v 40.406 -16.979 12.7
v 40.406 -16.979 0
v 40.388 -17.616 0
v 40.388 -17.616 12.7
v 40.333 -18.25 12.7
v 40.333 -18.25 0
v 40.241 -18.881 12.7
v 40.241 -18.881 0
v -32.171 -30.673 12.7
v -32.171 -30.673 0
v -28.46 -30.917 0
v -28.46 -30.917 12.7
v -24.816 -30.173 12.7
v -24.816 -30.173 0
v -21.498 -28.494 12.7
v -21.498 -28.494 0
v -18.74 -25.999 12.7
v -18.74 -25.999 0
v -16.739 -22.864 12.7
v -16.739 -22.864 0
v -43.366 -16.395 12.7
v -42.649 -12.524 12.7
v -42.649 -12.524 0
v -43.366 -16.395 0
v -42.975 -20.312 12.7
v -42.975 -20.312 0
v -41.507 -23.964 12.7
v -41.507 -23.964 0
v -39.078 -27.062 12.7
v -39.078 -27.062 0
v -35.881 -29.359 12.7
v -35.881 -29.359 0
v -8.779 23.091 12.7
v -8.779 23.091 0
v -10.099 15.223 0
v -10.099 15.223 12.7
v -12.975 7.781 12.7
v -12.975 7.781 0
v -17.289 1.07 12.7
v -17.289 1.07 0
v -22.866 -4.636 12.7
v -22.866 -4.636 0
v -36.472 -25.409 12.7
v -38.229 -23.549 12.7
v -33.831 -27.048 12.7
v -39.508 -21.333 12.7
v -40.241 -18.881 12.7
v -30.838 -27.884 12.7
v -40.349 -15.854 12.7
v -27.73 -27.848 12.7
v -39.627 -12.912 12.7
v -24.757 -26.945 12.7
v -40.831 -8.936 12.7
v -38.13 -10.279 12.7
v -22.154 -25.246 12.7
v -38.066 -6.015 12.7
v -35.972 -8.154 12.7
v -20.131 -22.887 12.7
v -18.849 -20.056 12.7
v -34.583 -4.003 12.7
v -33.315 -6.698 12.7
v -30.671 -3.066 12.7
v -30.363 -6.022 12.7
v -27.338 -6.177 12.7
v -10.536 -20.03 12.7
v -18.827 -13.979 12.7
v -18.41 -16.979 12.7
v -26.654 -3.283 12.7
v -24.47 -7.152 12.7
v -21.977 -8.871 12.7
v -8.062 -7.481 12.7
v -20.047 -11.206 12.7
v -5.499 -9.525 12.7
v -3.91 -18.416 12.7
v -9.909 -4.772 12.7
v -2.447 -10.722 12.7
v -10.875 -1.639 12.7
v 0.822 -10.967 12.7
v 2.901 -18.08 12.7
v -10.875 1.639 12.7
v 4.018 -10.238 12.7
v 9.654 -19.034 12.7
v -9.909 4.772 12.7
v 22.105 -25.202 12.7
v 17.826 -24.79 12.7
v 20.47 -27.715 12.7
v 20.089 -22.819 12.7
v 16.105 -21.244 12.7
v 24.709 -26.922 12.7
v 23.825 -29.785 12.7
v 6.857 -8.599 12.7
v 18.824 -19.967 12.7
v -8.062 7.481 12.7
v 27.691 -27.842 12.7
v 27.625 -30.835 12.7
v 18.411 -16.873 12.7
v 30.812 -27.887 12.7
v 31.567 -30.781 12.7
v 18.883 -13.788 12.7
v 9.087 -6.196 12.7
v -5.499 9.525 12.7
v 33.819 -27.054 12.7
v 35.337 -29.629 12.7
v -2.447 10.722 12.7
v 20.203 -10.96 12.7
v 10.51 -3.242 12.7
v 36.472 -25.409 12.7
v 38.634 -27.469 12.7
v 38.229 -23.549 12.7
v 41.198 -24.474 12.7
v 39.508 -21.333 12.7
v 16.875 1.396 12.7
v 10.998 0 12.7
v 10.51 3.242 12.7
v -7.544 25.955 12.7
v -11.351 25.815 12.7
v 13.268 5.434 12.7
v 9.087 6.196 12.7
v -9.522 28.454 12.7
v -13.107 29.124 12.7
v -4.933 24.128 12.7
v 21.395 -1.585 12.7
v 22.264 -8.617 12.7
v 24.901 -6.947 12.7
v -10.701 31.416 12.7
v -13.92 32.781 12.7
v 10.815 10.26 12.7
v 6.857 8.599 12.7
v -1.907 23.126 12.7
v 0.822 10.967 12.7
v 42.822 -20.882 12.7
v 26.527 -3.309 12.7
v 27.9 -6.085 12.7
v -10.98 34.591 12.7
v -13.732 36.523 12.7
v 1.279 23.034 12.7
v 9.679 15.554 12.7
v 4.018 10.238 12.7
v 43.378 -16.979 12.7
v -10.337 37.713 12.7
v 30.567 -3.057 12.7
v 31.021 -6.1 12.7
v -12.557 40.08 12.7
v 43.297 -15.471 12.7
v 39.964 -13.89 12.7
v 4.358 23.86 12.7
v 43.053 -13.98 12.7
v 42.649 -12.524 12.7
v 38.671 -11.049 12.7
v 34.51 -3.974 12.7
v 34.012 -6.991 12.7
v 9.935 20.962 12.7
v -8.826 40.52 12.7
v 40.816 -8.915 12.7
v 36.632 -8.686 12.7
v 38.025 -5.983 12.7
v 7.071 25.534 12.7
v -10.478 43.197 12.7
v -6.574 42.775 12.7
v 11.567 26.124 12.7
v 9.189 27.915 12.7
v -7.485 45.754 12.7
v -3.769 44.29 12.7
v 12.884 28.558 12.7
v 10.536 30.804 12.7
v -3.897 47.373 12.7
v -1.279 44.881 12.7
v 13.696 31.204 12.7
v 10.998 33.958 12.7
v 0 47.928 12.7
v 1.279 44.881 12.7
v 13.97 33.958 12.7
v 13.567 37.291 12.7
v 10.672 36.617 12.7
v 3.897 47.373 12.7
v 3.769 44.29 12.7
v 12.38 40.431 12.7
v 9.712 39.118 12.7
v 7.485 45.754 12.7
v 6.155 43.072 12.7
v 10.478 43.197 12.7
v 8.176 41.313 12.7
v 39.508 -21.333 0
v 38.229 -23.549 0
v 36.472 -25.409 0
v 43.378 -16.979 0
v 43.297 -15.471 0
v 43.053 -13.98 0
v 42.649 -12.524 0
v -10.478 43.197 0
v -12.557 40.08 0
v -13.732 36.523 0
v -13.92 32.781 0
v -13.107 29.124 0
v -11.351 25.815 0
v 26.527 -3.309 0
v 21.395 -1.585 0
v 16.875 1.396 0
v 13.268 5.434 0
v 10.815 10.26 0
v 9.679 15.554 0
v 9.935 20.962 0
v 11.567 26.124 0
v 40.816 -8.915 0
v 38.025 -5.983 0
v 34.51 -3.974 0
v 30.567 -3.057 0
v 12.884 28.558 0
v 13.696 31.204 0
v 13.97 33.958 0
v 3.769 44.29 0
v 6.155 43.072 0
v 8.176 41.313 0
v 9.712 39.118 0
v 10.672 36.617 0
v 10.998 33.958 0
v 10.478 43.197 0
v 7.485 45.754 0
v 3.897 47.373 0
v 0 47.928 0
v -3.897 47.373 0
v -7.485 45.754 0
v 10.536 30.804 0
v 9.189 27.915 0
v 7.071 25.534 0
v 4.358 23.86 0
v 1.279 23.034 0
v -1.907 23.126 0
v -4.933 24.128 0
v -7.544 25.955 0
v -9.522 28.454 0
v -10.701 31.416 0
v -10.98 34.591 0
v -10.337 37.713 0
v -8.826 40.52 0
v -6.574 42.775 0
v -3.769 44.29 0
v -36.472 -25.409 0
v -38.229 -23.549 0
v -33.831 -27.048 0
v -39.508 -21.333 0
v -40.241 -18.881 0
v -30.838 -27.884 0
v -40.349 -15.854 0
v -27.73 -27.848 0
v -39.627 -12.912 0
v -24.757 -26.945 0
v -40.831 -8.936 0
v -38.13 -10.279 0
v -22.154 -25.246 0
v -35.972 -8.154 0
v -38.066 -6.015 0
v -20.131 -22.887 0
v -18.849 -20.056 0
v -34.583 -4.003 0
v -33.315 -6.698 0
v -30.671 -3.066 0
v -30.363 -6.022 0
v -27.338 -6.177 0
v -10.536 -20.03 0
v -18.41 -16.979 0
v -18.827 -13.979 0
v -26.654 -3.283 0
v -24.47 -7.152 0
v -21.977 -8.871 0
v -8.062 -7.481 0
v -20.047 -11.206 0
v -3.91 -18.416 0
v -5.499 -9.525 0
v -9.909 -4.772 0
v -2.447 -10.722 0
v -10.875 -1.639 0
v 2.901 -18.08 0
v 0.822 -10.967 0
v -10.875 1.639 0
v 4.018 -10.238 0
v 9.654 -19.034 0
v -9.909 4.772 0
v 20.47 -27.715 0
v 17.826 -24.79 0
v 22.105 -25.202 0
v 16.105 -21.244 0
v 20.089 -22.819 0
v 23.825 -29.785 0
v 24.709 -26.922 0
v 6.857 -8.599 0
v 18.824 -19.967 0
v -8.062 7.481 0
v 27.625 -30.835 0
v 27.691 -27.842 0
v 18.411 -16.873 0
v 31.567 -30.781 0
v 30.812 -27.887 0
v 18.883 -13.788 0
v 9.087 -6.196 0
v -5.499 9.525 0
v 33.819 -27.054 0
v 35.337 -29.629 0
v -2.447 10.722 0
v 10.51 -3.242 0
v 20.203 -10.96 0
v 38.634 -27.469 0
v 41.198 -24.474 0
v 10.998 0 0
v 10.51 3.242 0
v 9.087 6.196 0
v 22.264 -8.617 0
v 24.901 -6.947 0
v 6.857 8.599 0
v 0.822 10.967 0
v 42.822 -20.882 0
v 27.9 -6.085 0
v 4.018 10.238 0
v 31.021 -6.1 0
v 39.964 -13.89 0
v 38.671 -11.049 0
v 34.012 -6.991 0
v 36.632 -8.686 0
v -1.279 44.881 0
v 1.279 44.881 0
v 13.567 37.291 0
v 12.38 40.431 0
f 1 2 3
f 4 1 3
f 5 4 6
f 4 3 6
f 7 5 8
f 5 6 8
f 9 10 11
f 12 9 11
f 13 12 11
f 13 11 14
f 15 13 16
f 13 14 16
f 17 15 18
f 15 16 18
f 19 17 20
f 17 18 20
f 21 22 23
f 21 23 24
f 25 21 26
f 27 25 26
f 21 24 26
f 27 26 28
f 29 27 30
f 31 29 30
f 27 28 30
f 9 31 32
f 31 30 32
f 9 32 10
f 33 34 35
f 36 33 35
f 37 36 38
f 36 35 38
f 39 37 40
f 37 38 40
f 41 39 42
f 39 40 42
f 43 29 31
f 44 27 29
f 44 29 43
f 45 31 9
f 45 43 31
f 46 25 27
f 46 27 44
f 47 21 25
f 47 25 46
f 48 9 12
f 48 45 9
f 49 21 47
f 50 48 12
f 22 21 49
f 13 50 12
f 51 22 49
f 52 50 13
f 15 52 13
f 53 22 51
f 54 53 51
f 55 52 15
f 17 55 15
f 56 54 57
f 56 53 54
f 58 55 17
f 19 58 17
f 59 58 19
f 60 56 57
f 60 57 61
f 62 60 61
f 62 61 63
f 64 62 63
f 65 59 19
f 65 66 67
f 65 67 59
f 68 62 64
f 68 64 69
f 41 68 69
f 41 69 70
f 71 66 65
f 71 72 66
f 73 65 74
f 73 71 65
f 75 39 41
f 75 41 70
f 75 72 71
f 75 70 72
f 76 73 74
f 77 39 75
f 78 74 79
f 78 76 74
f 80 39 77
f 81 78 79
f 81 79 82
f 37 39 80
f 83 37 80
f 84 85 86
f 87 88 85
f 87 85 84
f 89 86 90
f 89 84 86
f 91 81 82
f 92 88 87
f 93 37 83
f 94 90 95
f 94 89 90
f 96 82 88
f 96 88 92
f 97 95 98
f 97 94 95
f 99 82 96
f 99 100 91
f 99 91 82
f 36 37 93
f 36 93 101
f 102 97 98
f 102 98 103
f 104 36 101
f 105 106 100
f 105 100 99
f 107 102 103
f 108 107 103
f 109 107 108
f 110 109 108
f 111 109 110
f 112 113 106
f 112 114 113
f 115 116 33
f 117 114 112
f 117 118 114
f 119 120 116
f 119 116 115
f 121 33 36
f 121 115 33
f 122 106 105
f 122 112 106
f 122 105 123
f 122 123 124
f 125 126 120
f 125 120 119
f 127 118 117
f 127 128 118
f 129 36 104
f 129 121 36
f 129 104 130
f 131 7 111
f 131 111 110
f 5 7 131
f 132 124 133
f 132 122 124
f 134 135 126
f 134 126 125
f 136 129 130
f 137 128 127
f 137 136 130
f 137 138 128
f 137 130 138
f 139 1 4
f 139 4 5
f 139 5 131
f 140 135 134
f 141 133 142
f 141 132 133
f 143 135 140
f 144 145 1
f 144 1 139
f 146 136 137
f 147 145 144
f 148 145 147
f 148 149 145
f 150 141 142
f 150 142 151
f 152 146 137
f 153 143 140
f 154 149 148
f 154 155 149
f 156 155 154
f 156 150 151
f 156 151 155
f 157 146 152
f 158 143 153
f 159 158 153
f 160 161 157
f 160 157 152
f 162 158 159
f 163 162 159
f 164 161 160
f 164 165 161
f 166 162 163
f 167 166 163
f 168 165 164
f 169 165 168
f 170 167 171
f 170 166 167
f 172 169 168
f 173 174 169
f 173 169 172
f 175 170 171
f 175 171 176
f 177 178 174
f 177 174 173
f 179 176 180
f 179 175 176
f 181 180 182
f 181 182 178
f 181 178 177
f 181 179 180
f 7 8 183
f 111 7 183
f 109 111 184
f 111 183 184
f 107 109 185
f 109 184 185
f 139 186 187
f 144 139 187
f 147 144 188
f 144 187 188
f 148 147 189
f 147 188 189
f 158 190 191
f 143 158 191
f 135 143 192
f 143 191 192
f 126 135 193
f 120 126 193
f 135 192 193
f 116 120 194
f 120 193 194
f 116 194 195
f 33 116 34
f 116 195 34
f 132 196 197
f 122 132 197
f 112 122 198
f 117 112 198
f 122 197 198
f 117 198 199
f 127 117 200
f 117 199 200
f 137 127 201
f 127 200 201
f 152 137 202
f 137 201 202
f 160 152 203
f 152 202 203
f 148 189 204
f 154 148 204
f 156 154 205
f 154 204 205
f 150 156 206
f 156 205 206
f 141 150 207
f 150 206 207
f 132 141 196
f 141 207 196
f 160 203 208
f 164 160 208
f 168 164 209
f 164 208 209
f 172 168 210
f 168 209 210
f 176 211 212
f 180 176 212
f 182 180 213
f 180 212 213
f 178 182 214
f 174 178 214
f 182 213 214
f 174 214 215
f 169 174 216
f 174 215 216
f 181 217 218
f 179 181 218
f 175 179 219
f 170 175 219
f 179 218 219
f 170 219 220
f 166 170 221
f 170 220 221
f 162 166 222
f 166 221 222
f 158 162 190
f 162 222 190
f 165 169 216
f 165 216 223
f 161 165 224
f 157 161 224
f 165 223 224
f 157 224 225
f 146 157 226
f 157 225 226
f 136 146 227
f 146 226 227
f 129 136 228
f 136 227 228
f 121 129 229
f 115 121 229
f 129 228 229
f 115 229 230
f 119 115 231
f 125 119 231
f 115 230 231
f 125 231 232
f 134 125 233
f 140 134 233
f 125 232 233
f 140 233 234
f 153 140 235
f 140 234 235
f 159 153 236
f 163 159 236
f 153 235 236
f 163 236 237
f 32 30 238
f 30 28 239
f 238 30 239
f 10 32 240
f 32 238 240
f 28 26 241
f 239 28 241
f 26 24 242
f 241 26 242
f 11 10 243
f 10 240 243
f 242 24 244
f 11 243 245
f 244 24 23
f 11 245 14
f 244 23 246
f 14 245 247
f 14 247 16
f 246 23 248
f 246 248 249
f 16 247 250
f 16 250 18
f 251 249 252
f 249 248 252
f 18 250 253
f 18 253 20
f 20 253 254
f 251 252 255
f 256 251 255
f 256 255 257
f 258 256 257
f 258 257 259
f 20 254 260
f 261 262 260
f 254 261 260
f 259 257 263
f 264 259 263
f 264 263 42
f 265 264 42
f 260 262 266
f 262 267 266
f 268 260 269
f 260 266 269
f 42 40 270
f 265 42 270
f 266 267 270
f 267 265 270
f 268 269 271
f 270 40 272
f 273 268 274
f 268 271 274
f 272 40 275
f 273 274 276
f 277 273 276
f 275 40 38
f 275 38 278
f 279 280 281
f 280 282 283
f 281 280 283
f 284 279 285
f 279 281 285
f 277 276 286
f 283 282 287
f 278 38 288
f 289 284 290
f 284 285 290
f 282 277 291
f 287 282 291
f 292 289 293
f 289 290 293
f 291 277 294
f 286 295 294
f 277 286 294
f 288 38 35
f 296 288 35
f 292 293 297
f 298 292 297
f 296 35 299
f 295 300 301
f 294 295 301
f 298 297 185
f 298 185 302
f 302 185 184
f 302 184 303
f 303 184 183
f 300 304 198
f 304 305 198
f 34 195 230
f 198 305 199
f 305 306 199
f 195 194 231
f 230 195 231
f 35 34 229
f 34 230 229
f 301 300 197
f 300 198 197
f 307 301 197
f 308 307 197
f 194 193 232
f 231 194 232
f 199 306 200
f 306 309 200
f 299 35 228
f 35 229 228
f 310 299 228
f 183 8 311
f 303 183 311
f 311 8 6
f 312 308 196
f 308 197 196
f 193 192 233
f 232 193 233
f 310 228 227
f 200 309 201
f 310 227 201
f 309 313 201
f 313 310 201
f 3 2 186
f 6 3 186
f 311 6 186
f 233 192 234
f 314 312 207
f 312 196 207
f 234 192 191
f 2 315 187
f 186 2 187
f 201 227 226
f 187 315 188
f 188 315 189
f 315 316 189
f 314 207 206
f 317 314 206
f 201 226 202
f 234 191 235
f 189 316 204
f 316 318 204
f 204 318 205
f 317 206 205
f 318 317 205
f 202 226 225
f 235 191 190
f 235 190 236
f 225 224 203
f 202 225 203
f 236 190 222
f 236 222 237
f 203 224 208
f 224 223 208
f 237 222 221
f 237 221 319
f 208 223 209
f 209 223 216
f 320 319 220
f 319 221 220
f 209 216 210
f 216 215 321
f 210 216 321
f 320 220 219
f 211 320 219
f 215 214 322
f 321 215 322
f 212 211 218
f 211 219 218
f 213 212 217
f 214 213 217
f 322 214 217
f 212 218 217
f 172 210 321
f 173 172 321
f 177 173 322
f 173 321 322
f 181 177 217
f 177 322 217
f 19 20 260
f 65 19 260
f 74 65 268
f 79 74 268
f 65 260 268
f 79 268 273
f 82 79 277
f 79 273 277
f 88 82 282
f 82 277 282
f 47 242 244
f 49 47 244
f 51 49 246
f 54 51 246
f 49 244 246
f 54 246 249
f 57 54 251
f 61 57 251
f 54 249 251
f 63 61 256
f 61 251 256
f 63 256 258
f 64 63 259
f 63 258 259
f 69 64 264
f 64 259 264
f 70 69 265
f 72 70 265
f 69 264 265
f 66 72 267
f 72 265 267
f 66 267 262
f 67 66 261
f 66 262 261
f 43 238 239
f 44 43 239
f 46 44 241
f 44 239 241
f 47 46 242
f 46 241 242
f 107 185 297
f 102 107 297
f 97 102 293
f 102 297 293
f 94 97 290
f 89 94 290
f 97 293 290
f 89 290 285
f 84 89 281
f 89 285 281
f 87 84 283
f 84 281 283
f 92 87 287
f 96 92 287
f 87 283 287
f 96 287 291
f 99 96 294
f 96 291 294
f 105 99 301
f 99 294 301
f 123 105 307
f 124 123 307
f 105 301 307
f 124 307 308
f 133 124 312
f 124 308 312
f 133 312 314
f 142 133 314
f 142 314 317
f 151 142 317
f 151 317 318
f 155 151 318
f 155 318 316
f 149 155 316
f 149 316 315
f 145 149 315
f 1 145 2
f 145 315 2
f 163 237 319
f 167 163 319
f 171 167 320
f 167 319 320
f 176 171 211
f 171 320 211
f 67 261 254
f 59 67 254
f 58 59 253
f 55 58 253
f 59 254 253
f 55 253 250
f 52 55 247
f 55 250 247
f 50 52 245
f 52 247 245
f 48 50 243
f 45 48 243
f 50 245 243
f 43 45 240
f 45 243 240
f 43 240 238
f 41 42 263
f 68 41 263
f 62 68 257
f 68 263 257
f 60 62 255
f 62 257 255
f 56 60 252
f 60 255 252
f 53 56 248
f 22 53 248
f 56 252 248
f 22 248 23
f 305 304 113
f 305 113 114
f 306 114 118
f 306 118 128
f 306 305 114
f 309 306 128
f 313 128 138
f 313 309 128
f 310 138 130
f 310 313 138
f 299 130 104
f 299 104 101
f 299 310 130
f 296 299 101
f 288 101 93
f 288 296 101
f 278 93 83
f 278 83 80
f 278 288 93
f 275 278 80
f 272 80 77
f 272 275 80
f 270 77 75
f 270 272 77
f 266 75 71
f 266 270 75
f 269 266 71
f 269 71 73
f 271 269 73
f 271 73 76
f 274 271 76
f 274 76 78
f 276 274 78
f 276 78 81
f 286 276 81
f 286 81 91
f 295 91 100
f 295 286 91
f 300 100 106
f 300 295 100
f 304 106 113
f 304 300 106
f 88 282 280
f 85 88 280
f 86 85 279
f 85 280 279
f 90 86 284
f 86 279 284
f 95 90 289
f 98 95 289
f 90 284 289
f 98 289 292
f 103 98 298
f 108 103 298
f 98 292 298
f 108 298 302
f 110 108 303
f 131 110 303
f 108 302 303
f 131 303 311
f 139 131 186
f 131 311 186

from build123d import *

# Parameters (mm, degrees)
F0_R     = 13.97
F0_R_2   = 10.9982
F1_DEPTH = 12.7


with BuildPart() as f1:
    # F0 (on Top) → F1 (new body)
    with BuildSketch(Plane.XY):
        with BuildLine():
            ThreePointArc((16.1051536961, -21.2436426615), (17.3295442362, -9.9599210186), (26.5268333458, -3.3092534322))
            ThreePointArc((26.5268333458, -3.3092534322), (11.8850746566, 7.7674924981), (11.5671555945, 26.1243529429))
            ThreePointArc((11.5671555945, 26.1243529429), (2.0600739599, 20.1404593494), (-8.7790572587, 23.0908522342))
            ThreePointArc((-8.7790572587, 23.0908522342), (-12.9749986172, 7.7809801652), (-22.865745882, -4.6355904239))
            ThreePointArc((-22.865745882, -4.6355904239), (-17.4382996656, -9.7760184777), (-15.4382576825, -16.9788654894))
            ThreePointArc((-15.4382576825, -16.9788654894), (-15.7671993387, -19.9925720546), (-16.7385335967, -22.8643554087))
            ThreePointArc((-16.7385335967, -22.8643554087), (-0.5124879595, -18.0861592081), (16.1051536961, -21.2436426615))
        make_face()
        Circle(F0_R, mode=Mode.SUBTRACT)
        with BuildLine():
            ThreePointArc((-22.865745882, -4.6355904239), (-34.5827239411, -4.0025101097), (-42.649053732, -12.5244048067))
            ThreePointArc((-42.649053732, -12.5244048067), (-41.566588122, -15.7486904821), (-40.2407622083, -18.8807721477))
            ThreePointArc((-40.2407622083, -18.8807721477), (-30.3628130668, -6.022167663), (-18.4100576825, -16.9788654894))
            ThreePointArc((-18.4100576825, -16.9788654894), (-24.7565779814, -26.9449218408), (-36.4716094271, -25.4091362662))
            ThreePointArc((-36.4716094271, -25.4091362662), (-34.4220600948, -28.1233760212), (-32.1709795959, -30.672961576))
            ThreePointArc((-32.1709795959, -30.672961576), (-23.1010589715, -29.4440227054), (-16.7385335967, -22.8643554087))
            ThreePointArc((-16.7385335967, -22.8643554087), (-15.7671993387, -19.9925720546), (-15.4382576825, -16.9788654894))
            ThreePointArc((-15.4382576825, -16.9788654894), (-17.4382996656, -9.7760184777), (-22.865745882, -4.6355904239))
        make_face()
        with BuildLine():
            ThreePointArc((13.97, 33.9577309787), (13.0678918667, 38.8964658531), (10.4780741361, 43.1973663827))
            ThreePointArc((10.4780741361, 43.1973663827), (7.1445280272, 43.8720665033), (3.7691527812, 44.2899084139))
            ThreePointArc((3.7691527812, 44.2899084139), (9.011500967, 40.2627491041), (10.9982, 33.9577309787))
            ThreePointArc((10.9982, 33.9577309787), (-6.3050181253, 24.9462300117), (-3.7691527812, 44.2899084139))
            ThreePointArc((-3.7691527812, 44.2899084139), (-7.1445280272, 43.8720665033), (-10.4780741361, 43.1973663827))
            ThreePointArc((-10.4780741361, 43.1973663827), (-13.920389908, 32.7814466551), (-8.7790572587, 23.0908522342))
            ThreePointArc((-8.7790572587, 23.0908522342), (2.0600739599, 20.1404593494), (11.5671555945, 26.1243529429))
            ThreePointArc((11.5671555945, 26.1243529429), (13.3557864549, 29.8609190264), (13.97, 33.9577309787))
        make_face()
        with BuildLine():
            ThreePointArc((-40.2407622083, -18.8807721477), (-41.566588122, -15.7486904821), (-42.649053732, -12.5244048067))
            ThreePointArc((-42.649053732, -12.5244048067), (-41.5066325733, -23.9638654894), (-32.1709795959, -30.672961576))
            ThreePointArc((-32.1709795959, -30.672961576), (-34.4220600948, -28.1233760212), (-36.4716094271, -25.4091362662))
            ThreePointArc((-36.4716094271, -25.4091362662), (-38.9329782784, -22.4779654894), (-40.2407622083, -18.8807721477))
        make_face()
        with BuildLine():
            ThreePointArc((3.7691527812, 44.2899084139), (7.1445280272, 43.8720665033), (10.4780741361, 43.1973663827))
            ThreePointArc((10.4780741361, 43.1973663827), (0, 47.9277309787), (-10.4780741361, 43.1973663827))
            ThreePointArc((-10.4780741361, 43.1973663827), (-7.1445280272, 43.8720665033), (-3.7691527812, 44.2899084139))
            ThreePointArc((-3.7691527812, 44.2899084139), (0, 44.9559309787), (3.7691527812, 44.2899084139))
        make_face()
        with BuildLine():
            ThreePointArc((43.3782576825, -16.9788654894), (43.1947514501, -14.7219894197), (42.649053732, -12.5244048067))
            ThreePointArc((42.649053732, -12.5244048067), (41.566588122, -15.7486904821), (40.2407622083, -18.8807721477))
            ThreePointArc((40.2407622083, -18.8807721477), (38.9329782784, -22.4779654894), (36.4716094271, -25.4091362662))
            ThreePointArc((36.4716094271, -25.4091362662), (34.4220600948, -28.1233760212), (32.1709795959, -30.672961576))
            ThreePointArc((32.1709795959, -30.672961576), (40.2192734796, -25.8266243827), (43.3782576825, -16.9788654894))
        make_face()
        with BuildLine():
            ThreePointArc((40.2407622083, -18.8807721477), (41.566588122, -15.7486904821), (42.649053732, -12.5244048067))
            ThreePointArc((42.649053732, -12.5244048067), (36.3407102993, -4.8503041272), (26.5268333458, -3.3092534322))
            ThreePointArc((26.5268333458, -3.3092534322), (17.3295442362, -9.9599210186), (16.1051536961, -21.2436426615))
            ThreePointArc((16.1051536961, -21.2436426615), (22.3369828781, -29.0270177395), (32.1709795959, -30.672961576))
            ThreePointArc((32.1709795959, -30.672961576), (34.4220600948, -28.1233760212), (36.4716094271, -25.4091362662))
            ThreePointArc((36.4716094271, -25.4091362662), (19.4422013311, -12.3271857883), (40.4064576825, -16.9788654894))
            ThreePointArc((40.4064576825, -16.9788654894), (40.3649555088, -17.9334208737), (40.2407622083, -18.8807721477))
        make_face()
        Circle(F0_R)
        Circle(F0_R_2, mode=Mode.SUBTRACT)
    extrude(amount=F1_DEPTH)


solid = f1.part
